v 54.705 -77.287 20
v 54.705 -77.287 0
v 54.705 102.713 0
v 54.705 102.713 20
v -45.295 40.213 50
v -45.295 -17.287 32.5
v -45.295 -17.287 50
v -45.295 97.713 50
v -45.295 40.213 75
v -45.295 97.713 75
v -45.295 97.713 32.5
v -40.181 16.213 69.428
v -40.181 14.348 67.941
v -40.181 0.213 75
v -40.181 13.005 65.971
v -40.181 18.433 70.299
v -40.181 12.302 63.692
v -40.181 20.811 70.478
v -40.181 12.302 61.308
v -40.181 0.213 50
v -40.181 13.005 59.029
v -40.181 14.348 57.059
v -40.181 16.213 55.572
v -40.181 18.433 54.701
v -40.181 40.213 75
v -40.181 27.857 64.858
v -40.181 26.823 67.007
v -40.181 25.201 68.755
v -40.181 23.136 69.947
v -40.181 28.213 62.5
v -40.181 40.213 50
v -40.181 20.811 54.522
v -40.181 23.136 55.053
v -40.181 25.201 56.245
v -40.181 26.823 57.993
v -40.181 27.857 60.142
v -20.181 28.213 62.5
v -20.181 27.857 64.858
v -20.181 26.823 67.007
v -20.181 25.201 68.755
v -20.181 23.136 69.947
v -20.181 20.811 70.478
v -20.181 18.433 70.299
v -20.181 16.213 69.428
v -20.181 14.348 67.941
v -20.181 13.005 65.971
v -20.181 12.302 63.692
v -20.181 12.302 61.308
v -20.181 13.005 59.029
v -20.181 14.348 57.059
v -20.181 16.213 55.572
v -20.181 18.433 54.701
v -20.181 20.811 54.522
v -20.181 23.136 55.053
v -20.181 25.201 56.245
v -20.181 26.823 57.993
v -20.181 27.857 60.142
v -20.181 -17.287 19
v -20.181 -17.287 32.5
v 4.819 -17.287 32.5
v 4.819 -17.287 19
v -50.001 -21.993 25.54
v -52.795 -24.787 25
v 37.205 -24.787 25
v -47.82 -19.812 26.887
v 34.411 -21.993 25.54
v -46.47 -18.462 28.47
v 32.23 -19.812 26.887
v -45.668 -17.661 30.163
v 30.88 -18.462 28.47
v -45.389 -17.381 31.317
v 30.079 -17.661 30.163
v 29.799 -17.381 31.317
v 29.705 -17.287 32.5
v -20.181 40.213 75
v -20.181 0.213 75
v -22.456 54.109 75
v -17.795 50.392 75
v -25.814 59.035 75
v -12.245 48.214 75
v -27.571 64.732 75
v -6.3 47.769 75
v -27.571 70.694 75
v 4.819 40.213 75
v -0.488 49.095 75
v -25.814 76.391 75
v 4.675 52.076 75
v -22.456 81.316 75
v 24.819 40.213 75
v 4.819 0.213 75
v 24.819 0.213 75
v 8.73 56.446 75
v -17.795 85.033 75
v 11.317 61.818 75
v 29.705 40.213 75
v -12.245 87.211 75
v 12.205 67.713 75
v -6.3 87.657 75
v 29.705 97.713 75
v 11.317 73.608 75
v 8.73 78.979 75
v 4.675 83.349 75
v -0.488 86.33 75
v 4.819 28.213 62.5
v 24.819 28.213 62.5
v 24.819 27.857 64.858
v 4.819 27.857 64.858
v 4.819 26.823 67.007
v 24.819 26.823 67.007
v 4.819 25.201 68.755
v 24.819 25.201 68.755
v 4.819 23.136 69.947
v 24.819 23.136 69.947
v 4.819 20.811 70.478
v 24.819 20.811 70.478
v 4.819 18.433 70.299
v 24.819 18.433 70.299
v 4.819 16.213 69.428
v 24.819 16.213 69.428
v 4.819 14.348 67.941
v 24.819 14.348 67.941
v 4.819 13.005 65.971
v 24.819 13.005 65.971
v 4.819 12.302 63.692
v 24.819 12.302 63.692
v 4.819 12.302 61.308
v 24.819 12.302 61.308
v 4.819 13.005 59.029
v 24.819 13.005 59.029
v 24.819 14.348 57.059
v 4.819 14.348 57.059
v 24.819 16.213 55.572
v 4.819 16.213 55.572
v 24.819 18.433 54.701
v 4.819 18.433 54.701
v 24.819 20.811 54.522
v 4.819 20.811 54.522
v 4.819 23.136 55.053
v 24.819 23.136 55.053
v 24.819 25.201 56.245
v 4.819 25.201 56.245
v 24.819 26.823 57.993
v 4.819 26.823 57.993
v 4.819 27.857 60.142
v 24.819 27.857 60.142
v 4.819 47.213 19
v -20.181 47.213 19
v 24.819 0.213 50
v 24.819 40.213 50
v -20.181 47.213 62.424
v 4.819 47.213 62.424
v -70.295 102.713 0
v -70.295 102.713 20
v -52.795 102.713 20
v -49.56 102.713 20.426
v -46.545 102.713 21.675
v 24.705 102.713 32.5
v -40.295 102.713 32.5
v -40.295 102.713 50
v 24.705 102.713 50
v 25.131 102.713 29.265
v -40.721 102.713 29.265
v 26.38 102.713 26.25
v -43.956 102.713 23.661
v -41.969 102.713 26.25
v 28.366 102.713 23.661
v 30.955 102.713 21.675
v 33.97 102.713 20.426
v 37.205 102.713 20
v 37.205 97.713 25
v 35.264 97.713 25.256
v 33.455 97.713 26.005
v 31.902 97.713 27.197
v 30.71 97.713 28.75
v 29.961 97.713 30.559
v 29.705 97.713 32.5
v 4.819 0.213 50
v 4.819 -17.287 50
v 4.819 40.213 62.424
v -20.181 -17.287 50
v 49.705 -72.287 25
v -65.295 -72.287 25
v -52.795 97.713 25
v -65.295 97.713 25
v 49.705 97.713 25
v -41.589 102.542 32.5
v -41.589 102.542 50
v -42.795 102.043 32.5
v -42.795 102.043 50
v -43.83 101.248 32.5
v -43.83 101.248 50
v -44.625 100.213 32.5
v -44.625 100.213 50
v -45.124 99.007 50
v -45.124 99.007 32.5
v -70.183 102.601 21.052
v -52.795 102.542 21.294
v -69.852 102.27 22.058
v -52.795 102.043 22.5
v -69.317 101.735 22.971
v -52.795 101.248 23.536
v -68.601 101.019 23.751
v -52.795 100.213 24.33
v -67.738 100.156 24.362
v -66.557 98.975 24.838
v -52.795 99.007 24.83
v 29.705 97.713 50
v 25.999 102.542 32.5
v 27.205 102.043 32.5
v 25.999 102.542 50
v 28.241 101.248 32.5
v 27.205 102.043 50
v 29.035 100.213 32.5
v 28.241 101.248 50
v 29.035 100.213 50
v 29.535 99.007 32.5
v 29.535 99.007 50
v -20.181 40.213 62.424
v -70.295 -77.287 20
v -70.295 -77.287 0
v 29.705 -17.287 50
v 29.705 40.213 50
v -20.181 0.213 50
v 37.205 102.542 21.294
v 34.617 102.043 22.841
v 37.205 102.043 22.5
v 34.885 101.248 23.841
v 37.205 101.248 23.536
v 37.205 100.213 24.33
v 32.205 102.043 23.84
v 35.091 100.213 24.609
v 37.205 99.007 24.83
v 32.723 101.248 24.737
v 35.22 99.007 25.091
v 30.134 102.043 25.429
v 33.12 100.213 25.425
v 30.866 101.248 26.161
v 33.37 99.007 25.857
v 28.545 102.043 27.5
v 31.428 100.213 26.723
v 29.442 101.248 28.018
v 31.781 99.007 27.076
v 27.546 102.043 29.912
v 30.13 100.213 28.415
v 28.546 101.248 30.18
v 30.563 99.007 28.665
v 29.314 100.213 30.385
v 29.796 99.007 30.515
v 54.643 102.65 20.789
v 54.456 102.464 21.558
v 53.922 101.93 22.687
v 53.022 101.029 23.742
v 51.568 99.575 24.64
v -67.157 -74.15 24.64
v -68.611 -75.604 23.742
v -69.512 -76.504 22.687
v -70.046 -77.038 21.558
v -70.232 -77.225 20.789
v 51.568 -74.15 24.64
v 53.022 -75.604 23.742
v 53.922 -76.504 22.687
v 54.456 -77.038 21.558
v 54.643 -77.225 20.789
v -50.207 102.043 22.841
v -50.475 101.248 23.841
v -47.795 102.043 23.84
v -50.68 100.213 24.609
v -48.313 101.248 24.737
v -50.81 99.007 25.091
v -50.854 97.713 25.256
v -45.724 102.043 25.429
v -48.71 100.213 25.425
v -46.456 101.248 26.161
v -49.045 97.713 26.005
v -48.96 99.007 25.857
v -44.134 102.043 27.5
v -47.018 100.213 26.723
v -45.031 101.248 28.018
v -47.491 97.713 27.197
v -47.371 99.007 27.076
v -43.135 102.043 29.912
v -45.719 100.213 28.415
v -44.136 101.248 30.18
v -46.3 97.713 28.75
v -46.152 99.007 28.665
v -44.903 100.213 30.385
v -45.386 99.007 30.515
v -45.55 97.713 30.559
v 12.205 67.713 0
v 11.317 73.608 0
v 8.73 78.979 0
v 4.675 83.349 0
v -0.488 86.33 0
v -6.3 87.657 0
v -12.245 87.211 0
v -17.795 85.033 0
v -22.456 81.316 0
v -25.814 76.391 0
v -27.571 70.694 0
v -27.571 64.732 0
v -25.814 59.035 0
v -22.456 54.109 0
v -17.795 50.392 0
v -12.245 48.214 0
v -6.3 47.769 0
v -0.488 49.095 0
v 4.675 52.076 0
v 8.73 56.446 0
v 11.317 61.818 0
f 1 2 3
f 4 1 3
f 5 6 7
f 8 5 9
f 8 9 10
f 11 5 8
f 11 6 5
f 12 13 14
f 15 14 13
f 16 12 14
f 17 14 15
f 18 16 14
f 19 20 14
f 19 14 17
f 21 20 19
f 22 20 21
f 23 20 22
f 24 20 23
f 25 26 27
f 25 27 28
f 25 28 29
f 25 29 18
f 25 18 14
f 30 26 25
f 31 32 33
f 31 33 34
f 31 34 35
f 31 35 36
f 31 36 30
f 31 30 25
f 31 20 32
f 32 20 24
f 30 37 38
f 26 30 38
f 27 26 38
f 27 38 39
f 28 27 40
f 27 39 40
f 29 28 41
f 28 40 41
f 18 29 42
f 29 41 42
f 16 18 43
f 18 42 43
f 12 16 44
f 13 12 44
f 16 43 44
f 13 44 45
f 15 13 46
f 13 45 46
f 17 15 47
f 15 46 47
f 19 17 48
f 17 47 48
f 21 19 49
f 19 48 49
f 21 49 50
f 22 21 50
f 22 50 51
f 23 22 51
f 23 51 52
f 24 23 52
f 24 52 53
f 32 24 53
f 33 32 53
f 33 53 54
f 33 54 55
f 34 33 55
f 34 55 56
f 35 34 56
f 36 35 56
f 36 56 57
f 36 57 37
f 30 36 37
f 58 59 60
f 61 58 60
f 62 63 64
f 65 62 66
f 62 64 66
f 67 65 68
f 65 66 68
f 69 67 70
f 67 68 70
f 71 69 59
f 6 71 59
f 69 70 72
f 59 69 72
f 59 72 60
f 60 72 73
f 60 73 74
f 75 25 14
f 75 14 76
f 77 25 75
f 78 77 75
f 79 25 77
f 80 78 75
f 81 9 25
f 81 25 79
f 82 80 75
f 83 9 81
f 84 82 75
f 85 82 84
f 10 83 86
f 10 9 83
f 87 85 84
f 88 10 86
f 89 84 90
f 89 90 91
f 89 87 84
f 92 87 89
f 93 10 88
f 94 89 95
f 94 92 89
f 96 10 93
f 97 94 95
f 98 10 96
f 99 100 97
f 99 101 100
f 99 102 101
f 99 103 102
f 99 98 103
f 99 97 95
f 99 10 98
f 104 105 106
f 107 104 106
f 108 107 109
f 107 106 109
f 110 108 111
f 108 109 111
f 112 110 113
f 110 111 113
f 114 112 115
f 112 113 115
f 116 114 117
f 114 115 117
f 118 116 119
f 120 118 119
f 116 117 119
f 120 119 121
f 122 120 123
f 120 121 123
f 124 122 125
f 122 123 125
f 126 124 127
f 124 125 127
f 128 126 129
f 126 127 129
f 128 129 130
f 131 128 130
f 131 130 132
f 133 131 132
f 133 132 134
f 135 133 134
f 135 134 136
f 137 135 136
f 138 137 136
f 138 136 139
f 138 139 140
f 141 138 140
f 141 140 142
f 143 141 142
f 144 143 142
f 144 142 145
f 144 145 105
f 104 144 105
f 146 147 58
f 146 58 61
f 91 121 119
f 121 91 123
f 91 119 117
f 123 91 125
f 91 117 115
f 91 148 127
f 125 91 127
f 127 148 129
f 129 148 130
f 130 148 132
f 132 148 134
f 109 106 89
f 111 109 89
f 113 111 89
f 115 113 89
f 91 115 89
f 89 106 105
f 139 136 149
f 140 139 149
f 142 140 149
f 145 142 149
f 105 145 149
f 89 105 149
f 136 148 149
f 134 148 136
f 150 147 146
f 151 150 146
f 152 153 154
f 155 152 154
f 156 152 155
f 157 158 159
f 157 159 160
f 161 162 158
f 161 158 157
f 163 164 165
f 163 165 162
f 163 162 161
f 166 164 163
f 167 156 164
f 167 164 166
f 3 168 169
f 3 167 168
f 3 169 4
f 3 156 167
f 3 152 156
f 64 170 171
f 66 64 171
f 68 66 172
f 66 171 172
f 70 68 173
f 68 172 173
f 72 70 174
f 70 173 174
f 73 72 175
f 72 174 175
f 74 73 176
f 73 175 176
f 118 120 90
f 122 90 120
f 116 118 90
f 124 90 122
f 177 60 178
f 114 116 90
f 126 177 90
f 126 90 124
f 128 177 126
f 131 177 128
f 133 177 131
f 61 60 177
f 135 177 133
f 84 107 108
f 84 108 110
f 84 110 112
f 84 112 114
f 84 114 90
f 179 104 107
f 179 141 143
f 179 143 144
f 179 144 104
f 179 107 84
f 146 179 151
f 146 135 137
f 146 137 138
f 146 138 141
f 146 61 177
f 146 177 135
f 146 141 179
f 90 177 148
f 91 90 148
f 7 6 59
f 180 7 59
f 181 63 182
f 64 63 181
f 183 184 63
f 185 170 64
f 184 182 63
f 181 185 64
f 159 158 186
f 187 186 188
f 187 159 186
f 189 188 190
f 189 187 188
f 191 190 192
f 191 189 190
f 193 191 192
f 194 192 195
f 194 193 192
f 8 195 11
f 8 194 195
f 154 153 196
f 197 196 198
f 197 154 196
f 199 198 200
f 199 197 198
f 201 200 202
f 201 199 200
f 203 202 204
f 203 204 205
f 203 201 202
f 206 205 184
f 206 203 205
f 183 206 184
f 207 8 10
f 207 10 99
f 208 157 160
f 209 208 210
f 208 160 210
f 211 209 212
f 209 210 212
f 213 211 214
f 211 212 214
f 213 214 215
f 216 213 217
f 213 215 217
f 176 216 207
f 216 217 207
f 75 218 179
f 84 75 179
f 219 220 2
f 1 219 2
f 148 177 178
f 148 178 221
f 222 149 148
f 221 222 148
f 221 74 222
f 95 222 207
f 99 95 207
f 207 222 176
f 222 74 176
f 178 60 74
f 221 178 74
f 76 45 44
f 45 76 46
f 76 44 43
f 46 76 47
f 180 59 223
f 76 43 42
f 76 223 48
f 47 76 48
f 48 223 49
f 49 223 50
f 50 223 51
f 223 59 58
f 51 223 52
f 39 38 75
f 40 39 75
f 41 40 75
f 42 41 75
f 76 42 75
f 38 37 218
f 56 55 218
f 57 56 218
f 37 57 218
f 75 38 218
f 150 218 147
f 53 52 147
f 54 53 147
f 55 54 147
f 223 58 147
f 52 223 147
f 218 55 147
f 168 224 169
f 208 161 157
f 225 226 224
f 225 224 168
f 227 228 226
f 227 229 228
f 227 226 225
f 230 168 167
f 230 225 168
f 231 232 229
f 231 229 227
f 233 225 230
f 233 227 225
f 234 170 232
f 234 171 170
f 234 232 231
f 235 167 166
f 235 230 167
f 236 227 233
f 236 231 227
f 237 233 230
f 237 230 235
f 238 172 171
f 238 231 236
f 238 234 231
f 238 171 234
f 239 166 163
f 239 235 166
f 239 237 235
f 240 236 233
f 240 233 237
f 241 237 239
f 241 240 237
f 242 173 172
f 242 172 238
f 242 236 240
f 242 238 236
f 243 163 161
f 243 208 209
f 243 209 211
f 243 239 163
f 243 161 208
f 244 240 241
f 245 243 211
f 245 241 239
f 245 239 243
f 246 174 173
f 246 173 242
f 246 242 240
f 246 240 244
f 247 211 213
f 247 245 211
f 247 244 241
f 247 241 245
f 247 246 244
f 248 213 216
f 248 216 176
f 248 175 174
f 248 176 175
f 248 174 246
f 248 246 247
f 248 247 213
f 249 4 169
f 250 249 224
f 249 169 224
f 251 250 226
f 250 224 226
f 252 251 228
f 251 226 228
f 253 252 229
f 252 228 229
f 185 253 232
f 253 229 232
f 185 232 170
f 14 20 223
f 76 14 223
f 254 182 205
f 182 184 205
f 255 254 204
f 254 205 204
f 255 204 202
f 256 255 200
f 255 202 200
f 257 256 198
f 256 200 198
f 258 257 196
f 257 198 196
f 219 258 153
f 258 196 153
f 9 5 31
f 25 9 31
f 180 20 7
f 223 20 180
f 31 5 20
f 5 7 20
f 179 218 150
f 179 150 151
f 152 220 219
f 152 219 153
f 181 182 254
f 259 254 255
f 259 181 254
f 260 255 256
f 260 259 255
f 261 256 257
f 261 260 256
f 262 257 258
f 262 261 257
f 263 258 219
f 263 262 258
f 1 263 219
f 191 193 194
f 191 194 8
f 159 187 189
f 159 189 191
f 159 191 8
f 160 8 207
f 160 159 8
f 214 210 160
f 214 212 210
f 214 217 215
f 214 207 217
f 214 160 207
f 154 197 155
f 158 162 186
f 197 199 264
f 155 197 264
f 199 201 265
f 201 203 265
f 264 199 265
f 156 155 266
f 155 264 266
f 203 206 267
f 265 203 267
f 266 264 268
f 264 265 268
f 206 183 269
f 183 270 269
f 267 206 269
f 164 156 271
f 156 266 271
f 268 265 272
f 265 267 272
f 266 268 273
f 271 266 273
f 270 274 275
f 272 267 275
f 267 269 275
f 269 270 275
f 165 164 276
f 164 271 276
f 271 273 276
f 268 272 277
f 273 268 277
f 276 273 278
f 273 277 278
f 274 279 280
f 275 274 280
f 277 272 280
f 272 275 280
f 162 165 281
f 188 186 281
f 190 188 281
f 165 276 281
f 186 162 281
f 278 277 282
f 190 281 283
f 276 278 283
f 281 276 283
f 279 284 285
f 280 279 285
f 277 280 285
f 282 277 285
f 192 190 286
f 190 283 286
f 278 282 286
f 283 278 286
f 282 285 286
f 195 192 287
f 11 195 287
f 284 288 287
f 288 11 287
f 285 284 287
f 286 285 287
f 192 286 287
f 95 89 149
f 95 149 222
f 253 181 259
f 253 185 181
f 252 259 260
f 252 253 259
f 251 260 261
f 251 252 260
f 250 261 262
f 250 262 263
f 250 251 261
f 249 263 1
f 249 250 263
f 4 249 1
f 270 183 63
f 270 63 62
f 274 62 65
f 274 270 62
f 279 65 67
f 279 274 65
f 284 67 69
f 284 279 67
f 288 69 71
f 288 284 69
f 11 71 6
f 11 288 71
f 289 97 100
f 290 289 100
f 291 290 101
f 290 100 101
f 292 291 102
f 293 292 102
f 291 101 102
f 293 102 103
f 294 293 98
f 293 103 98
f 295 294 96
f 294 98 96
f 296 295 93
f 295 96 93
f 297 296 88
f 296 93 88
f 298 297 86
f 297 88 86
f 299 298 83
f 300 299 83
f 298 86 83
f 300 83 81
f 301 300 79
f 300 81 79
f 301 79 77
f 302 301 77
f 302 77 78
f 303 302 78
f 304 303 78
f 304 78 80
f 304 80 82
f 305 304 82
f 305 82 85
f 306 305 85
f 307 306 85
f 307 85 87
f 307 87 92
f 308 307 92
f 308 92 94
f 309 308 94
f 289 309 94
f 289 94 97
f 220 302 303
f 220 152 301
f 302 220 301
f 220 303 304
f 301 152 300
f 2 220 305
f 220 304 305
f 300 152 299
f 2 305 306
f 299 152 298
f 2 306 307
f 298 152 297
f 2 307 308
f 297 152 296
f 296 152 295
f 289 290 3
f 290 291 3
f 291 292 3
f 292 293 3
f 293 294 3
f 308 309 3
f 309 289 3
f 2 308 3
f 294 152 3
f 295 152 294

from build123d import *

# Parameters (mm, degrees)
SKETCH1_W           = 125
SKETCH1_H           = 180
BASE_EXTRUDE_DEPTH  = 25
SKETCH2_W           = 75
SKETCH2_H           = 120
BOSS_EXTRUDE1_DEPTH = 25
FILLET2_R           = 7.5
FILLET4_R           = 5
SKETCH4_W           = 75
SKETCH4_H           = 57.5
BOSS_EXTRUDE2_DEPTH = 25
SKETCH7_R           = 20
CUT_EXTRUDE2_DEPTH  = 105
SKETCH8_W           = 20
SKETCH8_H           = 40
BOSS_EXTRUDE4_DEPTH = 25
SKETCH9_R           = 8
CUT_EXTRUDE3_DEPTH  = 89
SKETCH10_W          = 25
SKETCH10_H          = 57.5
CUT_EXTRUDE4_DEPTH  = 31
SKETCH12_W          = 25
SKETCH12_H          = 43.423813554
CUT_EXTRUDE6_DEPTH  = 7


with BuildPart() as part:
    # Sketch1 → Base-Extrude (new body)
    with BuildSketch(Plane.XY):
        with Locations((-7.794747082, 12.712840467)):
            Rectangle(SKETCH1_W, SKETCH1_H)
    extrude(amount=BASE_EXTRUDE_DEPTH)

    # Sketch2 → Boss-Extrude1 (add)
    with BuildSketch(Plane.XY.offset(25)):
        with Locations((-7.794747082, 42.712840467)):
            Rectangle(SKETCH2_W, SKETCH2_H)
    extrude(amount=BOSS_EXTRUDE1_DEPTH)

    # Fillet2
    fillet2_edges = [part.edges().sort_by_distance(p)[0] for p in [
        (-45.294747082, 42.712840467, 25),
        (-7.794747082, -17.287159533, 25),
        (29.705252918, 42.712840467, 25),
    ]]
    fillet(fillet2_edges, radius=FILLET2_R)

    # Fillet4
    fillet4_edges = [part.edges().sort_by_distance(p)[0] for p in [
        (54.705252918, 12.712840467, 25),
        (-61.544747082, 102.712840467, 25),
        (-45.294747082, 102.712840467, 41.25),
        (29.705252918, 102.712840467, 41.25),
        (31.901952059, 102.712840467, 27.196699141),
        (-47.491446223, 102.712840467, 27.196699141),
        (-70.294747082, 12.712840467, 25),
        (-7.794747082, -77.287159533, 25),
    ]]
    fillet(fillet4_edges, radius=FILLET4_R)

    # Sketch4 → Boss-Extrude2 (add)
    with BuildSketch(Plane.XY.offset(50)):
        with Locations((-7.794747082, 68.962840467)):
            Rectangle(SKETCH4_W, SKETCH4_H)
    extrude(amount=BOSS_EXTRUDE2_DEPTH)

    # Sketch7 → Cut-Extrude2 (cut)
    with BuildSketch(Plane.XY.offset(75)):
        with Locations((-7.794747082, 67.712840467)):
            Circle(SKETCH7_R)
    extrude(amount=-CUT_EXTRUDE2_DEPTH, mode=Mode.SUBTRACT)

    # Sketch8 → Boss-Extrude4 (add)
    with BuildSketch(Plane.XY.offset(50)):
        with Locations((-30.180989309, 20.212840467)):
            Rectangle(SKETCH8_W, SKETCH8_H)
        with Locations((14.819010691, 20.212840467)):
            Rectangle(SKETCH8_W, SKETCH8_H)
    extrude(amount=BOSS_EXTRUDE4_DEPTH)

    # Sketch9 → Cut-Extrude3 (cut)
    with BuildSketch(Plane(origin=(24.819010691, 0, 0), x_dir=(0, 0, -1), z_dir=(1, 0, 0))):
        with Locations(Location((-62.5, 20.212840467, 0), (0, 0, 90))):
            Circle(SKETCH9_R)
    extrude(amount=-CUT_EXTRUDE3_DEPTH, mode=Mode.SUBTRACT)

    # Sketch10 → Cut-Extrude4 (cut)
    with BuildSketch(Plane.XY.offset(50)):
        with Locations((-7.680989309, 11.462840467)):
            Rectangle(SKETCH10_W, SKETCH10_H)
    extrude(amount=-CUT_EXTRUDE4_DEPTH, mode=Mode.SUBTRACT)

    # Sketch12 → Cut-Extrude6 (cut)
    with BuildSketch(Plane.XZ.offset(-40.212840467)):
        with Locations((-7.680989309, 40.711906777)):
            Rectangle(SKETCH12_W, SKETCH12_H)
    extrude(amount=-CUT_EXTRUDE6_DEPTH, mode=Mode.SUBTRACT)


solid = part.part
